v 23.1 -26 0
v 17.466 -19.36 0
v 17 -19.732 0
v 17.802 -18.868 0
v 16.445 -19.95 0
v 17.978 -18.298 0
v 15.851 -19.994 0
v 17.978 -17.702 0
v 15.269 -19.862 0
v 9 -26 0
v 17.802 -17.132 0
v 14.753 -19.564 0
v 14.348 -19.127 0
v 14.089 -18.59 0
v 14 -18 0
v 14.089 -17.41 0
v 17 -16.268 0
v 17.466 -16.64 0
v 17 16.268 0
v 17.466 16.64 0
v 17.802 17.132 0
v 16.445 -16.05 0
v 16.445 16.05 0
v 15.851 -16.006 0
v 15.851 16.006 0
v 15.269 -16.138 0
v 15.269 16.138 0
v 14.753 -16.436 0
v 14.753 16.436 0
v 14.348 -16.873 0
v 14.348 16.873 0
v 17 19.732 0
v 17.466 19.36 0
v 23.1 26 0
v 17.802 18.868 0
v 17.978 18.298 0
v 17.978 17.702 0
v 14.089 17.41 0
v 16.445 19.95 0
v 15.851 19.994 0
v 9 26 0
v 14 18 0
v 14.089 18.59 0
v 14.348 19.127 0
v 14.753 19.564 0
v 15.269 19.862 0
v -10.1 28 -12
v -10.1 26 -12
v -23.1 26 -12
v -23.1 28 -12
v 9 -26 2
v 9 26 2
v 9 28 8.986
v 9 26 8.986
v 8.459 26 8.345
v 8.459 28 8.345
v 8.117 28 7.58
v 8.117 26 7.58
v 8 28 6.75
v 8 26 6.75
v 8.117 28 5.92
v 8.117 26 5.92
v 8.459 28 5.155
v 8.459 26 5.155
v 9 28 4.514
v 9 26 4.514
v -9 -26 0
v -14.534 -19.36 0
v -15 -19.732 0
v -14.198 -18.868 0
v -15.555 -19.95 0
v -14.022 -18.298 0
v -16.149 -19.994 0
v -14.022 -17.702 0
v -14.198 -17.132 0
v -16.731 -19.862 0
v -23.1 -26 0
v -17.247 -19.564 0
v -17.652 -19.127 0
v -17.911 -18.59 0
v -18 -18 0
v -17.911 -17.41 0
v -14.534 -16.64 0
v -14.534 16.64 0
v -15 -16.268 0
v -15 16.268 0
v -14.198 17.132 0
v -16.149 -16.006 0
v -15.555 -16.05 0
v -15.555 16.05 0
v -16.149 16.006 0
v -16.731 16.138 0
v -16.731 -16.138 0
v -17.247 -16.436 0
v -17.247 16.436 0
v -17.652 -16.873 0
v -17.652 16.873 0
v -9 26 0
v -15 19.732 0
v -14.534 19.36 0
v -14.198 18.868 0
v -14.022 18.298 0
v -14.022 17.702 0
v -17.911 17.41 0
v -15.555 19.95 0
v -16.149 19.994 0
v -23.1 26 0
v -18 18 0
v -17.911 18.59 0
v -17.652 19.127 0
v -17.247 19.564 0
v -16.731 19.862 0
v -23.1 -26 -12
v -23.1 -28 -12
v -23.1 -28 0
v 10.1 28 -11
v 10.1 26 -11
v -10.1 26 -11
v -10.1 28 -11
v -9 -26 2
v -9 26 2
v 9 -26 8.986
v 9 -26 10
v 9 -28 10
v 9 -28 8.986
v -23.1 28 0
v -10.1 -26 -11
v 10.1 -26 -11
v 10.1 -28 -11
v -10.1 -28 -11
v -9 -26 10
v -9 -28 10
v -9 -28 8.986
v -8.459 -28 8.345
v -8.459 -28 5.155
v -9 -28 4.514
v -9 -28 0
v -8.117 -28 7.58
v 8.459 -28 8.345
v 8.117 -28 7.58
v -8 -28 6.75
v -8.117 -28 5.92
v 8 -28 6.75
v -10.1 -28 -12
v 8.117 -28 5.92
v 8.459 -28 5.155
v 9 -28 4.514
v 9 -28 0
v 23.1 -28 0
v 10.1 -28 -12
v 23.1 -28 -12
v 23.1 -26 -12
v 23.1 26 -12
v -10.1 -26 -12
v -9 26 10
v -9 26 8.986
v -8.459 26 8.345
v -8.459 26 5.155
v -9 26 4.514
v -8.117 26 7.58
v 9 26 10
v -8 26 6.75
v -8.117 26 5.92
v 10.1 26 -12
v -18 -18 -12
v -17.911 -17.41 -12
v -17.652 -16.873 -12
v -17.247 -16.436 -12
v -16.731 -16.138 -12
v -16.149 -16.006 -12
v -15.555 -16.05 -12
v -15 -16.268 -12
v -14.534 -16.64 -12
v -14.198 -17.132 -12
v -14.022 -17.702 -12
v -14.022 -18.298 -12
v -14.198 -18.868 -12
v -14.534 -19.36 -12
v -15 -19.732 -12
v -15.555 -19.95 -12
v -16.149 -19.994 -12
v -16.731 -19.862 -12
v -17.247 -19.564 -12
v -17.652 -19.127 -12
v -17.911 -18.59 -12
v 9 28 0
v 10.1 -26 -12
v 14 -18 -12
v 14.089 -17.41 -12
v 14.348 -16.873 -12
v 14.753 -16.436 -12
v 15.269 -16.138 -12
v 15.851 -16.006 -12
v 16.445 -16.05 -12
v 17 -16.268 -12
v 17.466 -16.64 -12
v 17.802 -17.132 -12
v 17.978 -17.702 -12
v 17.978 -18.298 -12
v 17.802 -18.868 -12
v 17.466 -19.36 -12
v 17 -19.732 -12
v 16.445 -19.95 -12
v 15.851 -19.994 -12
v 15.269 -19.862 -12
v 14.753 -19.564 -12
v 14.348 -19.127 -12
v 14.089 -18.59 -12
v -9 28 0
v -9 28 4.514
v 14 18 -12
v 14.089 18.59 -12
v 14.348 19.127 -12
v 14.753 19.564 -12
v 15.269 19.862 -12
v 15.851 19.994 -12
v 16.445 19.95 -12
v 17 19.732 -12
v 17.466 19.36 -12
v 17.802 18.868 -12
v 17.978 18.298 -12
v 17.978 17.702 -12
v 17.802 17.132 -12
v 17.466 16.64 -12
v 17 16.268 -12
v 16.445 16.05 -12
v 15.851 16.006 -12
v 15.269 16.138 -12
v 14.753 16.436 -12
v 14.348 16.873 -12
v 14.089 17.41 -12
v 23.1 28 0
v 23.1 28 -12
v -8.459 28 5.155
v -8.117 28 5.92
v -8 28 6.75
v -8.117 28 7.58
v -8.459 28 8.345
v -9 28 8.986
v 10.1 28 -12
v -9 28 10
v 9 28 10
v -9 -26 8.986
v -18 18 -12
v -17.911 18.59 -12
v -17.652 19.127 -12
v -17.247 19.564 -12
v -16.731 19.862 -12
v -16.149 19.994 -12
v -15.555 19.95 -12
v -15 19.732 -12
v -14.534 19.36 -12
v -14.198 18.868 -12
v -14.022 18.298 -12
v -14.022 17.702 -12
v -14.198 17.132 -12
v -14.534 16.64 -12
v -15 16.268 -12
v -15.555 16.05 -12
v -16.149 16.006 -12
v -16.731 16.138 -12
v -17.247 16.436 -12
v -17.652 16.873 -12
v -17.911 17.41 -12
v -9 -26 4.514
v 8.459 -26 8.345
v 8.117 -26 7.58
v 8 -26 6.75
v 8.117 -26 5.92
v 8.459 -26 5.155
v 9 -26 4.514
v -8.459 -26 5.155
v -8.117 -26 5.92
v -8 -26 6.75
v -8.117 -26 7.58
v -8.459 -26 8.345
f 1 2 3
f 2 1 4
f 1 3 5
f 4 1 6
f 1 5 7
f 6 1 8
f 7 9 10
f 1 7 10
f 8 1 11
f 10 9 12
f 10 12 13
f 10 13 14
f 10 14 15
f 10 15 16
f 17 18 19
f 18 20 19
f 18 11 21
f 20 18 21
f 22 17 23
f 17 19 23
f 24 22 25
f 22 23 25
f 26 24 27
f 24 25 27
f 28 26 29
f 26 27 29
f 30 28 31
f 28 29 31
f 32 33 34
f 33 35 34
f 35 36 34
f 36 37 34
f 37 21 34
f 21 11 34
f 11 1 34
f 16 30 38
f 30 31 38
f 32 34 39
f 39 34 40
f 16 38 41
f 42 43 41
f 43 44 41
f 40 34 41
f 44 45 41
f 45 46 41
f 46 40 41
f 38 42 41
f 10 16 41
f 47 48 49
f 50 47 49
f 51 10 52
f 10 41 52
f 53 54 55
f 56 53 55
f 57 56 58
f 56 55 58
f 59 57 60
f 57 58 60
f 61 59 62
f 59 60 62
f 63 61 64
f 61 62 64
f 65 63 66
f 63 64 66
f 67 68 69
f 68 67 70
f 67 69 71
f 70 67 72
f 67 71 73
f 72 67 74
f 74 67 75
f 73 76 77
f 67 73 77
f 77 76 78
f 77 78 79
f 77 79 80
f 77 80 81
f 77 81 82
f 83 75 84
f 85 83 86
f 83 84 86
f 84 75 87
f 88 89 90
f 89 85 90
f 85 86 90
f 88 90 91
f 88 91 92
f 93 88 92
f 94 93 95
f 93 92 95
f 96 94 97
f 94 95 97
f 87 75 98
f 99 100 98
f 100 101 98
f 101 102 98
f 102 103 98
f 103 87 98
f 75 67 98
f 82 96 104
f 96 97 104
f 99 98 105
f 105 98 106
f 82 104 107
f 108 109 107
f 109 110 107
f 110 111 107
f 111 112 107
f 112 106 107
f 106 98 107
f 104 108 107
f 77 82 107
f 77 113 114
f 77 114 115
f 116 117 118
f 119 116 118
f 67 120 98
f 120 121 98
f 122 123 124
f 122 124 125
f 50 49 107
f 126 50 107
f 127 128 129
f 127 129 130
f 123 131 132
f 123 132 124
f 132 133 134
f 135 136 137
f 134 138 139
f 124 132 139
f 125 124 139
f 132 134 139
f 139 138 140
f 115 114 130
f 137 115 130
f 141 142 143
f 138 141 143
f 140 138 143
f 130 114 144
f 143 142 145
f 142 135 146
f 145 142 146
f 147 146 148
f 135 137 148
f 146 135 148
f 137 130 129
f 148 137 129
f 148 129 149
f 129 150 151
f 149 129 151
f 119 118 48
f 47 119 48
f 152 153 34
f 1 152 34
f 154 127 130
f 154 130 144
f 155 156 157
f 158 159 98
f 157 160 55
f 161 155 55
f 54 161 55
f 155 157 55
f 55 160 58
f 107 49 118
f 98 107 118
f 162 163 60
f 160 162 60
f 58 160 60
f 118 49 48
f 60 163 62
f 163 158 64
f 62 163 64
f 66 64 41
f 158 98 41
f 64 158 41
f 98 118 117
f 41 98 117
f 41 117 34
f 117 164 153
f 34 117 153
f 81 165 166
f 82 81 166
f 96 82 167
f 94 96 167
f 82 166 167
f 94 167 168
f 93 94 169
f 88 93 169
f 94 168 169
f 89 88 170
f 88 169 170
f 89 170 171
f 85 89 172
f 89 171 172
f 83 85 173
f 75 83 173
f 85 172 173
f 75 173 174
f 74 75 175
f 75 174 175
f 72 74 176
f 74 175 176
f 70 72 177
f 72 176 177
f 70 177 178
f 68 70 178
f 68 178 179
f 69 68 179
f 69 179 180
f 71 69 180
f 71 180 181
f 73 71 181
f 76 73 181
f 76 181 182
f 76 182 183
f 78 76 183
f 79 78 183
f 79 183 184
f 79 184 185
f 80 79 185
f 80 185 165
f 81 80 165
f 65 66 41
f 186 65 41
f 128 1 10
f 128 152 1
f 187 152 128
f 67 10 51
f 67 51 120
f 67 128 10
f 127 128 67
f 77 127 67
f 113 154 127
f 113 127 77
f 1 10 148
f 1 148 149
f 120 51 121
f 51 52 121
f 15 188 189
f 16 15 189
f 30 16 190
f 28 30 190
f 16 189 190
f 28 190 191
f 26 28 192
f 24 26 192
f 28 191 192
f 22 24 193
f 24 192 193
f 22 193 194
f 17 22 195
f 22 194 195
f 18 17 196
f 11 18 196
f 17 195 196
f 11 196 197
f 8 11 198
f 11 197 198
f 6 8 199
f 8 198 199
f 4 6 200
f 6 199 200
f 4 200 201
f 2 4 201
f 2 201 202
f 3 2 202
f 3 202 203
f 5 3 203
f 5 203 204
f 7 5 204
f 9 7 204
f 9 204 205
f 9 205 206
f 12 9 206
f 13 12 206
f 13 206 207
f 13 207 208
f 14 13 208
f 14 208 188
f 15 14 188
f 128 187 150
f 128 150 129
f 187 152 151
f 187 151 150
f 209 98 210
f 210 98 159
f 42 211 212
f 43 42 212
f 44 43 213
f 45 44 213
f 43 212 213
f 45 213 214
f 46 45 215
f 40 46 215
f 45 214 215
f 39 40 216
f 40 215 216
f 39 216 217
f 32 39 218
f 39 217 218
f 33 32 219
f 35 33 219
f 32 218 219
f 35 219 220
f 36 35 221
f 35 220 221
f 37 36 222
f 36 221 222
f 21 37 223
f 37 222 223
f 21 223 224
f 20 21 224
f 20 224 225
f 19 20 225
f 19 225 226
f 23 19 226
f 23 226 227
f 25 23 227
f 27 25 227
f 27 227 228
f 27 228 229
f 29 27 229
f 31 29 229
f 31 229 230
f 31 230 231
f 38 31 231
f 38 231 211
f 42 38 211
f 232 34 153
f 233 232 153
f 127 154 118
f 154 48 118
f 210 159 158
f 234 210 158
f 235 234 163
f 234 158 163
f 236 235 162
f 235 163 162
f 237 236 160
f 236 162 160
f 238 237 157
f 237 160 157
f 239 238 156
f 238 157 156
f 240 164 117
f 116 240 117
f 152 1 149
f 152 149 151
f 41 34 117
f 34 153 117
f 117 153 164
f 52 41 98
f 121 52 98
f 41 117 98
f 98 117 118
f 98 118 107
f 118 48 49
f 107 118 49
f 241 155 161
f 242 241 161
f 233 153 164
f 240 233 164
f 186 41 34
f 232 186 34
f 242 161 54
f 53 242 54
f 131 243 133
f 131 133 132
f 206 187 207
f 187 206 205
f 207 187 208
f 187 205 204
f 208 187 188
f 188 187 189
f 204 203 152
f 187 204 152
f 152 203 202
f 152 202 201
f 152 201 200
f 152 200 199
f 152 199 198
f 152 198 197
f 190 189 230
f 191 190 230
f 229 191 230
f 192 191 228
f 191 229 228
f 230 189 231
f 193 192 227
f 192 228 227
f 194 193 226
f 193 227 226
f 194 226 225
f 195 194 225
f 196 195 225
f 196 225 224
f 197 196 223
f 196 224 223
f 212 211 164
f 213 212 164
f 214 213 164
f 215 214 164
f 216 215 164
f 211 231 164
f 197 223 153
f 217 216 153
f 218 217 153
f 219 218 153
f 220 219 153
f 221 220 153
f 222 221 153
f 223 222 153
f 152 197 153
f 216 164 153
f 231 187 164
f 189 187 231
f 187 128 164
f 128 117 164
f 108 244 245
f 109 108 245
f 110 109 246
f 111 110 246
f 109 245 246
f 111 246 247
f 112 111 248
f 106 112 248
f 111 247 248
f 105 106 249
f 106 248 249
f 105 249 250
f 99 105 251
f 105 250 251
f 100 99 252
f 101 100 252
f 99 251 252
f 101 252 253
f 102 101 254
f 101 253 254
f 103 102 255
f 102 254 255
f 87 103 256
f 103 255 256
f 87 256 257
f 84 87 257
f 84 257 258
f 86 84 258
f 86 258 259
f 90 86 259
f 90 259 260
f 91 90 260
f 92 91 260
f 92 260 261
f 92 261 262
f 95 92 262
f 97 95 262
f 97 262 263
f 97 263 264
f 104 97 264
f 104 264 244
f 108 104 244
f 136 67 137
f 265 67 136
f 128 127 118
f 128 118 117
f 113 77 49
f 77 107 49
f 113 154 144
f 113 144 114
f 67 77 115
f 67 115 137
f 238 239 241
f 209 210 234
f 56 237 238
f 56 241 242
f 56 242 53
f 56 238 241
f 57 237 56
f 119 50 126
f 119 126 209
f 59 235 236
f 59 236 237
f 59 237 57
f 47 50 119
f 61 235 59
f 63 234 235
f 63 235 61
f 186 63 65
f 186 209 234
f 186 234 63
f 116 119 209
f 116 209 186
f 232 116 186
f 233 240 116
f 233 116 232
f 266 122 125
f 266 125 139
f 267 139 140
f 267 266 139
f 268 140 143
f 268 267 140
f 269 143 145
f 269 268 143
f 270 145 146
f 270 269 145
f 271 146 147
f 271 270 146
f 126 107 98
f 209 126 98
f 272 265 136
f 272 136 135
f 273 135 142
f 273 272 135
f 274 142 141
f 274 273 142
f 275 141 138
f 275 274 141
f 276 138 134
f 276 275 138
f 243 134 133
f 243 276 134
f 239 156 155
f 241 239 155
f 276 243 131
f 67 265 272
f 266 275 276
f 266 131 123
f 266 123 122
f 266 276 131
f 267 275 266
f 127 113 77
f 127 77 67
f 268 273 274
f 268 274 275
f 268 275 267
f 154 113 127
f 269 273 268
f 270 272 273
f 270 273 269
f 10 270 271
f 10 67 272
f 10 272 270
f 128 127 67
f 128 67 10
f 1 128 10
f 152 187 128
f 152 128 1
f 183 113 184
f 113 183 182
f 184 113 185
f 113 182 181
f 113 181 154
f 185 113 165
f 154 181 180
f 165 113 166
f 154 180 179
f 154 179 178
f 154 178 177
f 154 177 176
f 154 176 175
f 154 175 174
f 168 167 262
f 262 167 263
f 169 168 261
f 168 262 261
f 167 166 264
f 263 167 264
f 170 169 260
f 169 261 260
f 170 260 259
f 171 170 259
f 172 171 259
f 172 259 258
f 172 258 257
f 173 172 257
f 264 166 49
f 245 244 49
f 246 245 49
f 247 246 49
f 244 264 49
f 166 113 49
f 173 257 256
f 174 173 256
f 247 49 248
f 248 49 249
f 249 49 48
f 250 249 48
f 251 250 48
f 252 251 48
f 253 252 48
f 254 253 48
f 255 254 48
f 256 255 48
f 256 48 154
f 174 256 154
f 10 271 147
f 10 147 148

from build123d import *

# Parameters (mm, degrees)
BOSS_EXTRUDE1_DEPTH = 26
CUT_EXTRUDE1_REACH  = 16
SKETCH2_R           = 2
BOSS_EXTRUDE2_DEPTH = 2


with BuildPart() as part:
    # Sketch1 → Boss-Extrude1 (new body, symmetric)
    with BuildSketch(Plane(origin=(0, 0, 0), x_dir=(1, 0, 0), z_dir=(0, 1, 0))):
        Polygon((23.1, 0), (9, 0), (9, -2), (-9, -2), (-9, 0), (-23.1, 0), (-23.1, 12), (-10.1, 12), (-10.1, 11), (10.1, 11), (10.1, 12), (23.1, 12), align=None)
    extrude(amount=BOSS_EXTRUDE1_DEPTH, both=True)

    # Sketch2 → Cut-Extrude1 (cut, up to next)
    with BuildSketch(Plane(origin=(0, 0, -12), x_dir=(-1, 0, 0), z_dir=(0, 0, -1)), mode=Mode.PRIVATE) as cut_extrude1_sk1:
        with Locations((16, -18)):
            Circle(SKETCH2_R)
    cut_extrude1_tool1 = extrude(cut_extrude1_sk1.sketch, amount=-CUT_EXTRUDE1_REACH, mode=Mode.PRIVATE) & part.part
    add(cut_extrude1_tool1.solids().sort_by_distance((-16, -18, -12))[0], mode=Mode.SUBTRACT)
    # Sketch2 → Cut-Extrude1 (cut, up to next)
    with BuildSketch(Plane(origin=(0, 0, -12), x_dir=(-1, 0, 0), z_dir=(0, 0, -1)), mode=Mode.PRIVATE) as cut_extrude1_sk2:
        with Locations((-16, -18)):
            Circle(SKETCH2_R)
    cut_extrude1_tool2 = extrude(cut_extrude1_sk2.sketch, amount=-CUT_EXTRUDE1_REACH, mode=Mode.PRIVATE) & part.part
    add(cut_extrude1_tool2.solids().sort_by_distance((16, -18, -12))[0], mode=Mode.SUBTRACT)
    # Sketch2 → Cut-Extrude1 (cut, up to next)
    with BuildSketch(Plane(origin=(0, 0, -12), x_dir=(-1, 0, 0), z_dir=(0, 0, -1)), mode=Mode.PRIVATE) as cut_extrude1_sk3:
        with Locations((-16, 18)):
            Circle(SKETCH2_R)
    cut_extrude1_tool3 = extrude(cut_extrude1_sk3.sketch, amount=-CUT_EXTRUDE1_REACH, mode=Mode.PRIVATE) & part.part
    add(cut_extrude1_tool3.solids().sort_by_distance((16, 18, -12))[0], mode=Mode.SUBTRACT)
    # Sketch2 → Cut-Extrude1 (cut, up to next)
    with BuildSketch(Plane(origin=(0, 0, -12), x_dir=(-1, 0, 0), z_dir=(0, 0, -1)), mode=Mode.PRIVATE) as cut_extrude1_sk4:
        with Locations((16, 18)):
            Circle(SKETCH2_R)
    cut_extrude1_tool4 = extrude(cut_extrude1_sk4.sketch, amount=-CUT_EXTRUDE1_REACH, mode=Mode.PRIVATE) & part.part
    add(cut_extrude1_tool4.solids().sort_by_distance((-16, 18, -12))[0], mode=Mode.SUBTRACT)


with BuildPart() as body_2:
    # Sketch3 → Boss-Extrude2 (new body)
    with BuildSketch(Plane(origin=(0, 26, 0), x_dir=(1, 0, 0), z_dir=(0, 1, 0))):
        with BuildLine():
            Line((10.1, 11), (-10.1, 11))
            Line((-10.1, 11), (-10.1, 12))
            Line((-10.1, 12), (-23.1, 12))
            Line((-23.1, 12), (-23.1, 0))
            Line((-23.1, 0), (-9, 0))
            Line((-9, 0), (-9, -4.513932023))
            ThreePointArc((-9, -4.513932023), (-8, -6.75), (-9, -8.986067977))
            Line((-9, -8.986067977), (-9, -10))
            Line((-9, -10), (9, -10))
            Line((9, -10), (9, -8.986067977))
            ThreePointArc((9, -8.986067977), (8, -6.75), (9, -4.513932023))
            Line((9, -4.513932023), (9, 0))
            Line((9, 0), (23.1, 0))
            Line((23.1, 0), (23.1, 12))
            Line((23.1, 12), (10.1, 12))
            Line((10.1, 12), (10.1, 11))
        make_face()
    extrude(amount=BOSS_EXTRUDE2_DEPTH)


with BuildPart() as body_3:
    # Mirror2: mirrored copy
    add(body_2.part.mirror(Plane.ZX))


solid = Compound([part.part, body_2.part, body_3.part])
